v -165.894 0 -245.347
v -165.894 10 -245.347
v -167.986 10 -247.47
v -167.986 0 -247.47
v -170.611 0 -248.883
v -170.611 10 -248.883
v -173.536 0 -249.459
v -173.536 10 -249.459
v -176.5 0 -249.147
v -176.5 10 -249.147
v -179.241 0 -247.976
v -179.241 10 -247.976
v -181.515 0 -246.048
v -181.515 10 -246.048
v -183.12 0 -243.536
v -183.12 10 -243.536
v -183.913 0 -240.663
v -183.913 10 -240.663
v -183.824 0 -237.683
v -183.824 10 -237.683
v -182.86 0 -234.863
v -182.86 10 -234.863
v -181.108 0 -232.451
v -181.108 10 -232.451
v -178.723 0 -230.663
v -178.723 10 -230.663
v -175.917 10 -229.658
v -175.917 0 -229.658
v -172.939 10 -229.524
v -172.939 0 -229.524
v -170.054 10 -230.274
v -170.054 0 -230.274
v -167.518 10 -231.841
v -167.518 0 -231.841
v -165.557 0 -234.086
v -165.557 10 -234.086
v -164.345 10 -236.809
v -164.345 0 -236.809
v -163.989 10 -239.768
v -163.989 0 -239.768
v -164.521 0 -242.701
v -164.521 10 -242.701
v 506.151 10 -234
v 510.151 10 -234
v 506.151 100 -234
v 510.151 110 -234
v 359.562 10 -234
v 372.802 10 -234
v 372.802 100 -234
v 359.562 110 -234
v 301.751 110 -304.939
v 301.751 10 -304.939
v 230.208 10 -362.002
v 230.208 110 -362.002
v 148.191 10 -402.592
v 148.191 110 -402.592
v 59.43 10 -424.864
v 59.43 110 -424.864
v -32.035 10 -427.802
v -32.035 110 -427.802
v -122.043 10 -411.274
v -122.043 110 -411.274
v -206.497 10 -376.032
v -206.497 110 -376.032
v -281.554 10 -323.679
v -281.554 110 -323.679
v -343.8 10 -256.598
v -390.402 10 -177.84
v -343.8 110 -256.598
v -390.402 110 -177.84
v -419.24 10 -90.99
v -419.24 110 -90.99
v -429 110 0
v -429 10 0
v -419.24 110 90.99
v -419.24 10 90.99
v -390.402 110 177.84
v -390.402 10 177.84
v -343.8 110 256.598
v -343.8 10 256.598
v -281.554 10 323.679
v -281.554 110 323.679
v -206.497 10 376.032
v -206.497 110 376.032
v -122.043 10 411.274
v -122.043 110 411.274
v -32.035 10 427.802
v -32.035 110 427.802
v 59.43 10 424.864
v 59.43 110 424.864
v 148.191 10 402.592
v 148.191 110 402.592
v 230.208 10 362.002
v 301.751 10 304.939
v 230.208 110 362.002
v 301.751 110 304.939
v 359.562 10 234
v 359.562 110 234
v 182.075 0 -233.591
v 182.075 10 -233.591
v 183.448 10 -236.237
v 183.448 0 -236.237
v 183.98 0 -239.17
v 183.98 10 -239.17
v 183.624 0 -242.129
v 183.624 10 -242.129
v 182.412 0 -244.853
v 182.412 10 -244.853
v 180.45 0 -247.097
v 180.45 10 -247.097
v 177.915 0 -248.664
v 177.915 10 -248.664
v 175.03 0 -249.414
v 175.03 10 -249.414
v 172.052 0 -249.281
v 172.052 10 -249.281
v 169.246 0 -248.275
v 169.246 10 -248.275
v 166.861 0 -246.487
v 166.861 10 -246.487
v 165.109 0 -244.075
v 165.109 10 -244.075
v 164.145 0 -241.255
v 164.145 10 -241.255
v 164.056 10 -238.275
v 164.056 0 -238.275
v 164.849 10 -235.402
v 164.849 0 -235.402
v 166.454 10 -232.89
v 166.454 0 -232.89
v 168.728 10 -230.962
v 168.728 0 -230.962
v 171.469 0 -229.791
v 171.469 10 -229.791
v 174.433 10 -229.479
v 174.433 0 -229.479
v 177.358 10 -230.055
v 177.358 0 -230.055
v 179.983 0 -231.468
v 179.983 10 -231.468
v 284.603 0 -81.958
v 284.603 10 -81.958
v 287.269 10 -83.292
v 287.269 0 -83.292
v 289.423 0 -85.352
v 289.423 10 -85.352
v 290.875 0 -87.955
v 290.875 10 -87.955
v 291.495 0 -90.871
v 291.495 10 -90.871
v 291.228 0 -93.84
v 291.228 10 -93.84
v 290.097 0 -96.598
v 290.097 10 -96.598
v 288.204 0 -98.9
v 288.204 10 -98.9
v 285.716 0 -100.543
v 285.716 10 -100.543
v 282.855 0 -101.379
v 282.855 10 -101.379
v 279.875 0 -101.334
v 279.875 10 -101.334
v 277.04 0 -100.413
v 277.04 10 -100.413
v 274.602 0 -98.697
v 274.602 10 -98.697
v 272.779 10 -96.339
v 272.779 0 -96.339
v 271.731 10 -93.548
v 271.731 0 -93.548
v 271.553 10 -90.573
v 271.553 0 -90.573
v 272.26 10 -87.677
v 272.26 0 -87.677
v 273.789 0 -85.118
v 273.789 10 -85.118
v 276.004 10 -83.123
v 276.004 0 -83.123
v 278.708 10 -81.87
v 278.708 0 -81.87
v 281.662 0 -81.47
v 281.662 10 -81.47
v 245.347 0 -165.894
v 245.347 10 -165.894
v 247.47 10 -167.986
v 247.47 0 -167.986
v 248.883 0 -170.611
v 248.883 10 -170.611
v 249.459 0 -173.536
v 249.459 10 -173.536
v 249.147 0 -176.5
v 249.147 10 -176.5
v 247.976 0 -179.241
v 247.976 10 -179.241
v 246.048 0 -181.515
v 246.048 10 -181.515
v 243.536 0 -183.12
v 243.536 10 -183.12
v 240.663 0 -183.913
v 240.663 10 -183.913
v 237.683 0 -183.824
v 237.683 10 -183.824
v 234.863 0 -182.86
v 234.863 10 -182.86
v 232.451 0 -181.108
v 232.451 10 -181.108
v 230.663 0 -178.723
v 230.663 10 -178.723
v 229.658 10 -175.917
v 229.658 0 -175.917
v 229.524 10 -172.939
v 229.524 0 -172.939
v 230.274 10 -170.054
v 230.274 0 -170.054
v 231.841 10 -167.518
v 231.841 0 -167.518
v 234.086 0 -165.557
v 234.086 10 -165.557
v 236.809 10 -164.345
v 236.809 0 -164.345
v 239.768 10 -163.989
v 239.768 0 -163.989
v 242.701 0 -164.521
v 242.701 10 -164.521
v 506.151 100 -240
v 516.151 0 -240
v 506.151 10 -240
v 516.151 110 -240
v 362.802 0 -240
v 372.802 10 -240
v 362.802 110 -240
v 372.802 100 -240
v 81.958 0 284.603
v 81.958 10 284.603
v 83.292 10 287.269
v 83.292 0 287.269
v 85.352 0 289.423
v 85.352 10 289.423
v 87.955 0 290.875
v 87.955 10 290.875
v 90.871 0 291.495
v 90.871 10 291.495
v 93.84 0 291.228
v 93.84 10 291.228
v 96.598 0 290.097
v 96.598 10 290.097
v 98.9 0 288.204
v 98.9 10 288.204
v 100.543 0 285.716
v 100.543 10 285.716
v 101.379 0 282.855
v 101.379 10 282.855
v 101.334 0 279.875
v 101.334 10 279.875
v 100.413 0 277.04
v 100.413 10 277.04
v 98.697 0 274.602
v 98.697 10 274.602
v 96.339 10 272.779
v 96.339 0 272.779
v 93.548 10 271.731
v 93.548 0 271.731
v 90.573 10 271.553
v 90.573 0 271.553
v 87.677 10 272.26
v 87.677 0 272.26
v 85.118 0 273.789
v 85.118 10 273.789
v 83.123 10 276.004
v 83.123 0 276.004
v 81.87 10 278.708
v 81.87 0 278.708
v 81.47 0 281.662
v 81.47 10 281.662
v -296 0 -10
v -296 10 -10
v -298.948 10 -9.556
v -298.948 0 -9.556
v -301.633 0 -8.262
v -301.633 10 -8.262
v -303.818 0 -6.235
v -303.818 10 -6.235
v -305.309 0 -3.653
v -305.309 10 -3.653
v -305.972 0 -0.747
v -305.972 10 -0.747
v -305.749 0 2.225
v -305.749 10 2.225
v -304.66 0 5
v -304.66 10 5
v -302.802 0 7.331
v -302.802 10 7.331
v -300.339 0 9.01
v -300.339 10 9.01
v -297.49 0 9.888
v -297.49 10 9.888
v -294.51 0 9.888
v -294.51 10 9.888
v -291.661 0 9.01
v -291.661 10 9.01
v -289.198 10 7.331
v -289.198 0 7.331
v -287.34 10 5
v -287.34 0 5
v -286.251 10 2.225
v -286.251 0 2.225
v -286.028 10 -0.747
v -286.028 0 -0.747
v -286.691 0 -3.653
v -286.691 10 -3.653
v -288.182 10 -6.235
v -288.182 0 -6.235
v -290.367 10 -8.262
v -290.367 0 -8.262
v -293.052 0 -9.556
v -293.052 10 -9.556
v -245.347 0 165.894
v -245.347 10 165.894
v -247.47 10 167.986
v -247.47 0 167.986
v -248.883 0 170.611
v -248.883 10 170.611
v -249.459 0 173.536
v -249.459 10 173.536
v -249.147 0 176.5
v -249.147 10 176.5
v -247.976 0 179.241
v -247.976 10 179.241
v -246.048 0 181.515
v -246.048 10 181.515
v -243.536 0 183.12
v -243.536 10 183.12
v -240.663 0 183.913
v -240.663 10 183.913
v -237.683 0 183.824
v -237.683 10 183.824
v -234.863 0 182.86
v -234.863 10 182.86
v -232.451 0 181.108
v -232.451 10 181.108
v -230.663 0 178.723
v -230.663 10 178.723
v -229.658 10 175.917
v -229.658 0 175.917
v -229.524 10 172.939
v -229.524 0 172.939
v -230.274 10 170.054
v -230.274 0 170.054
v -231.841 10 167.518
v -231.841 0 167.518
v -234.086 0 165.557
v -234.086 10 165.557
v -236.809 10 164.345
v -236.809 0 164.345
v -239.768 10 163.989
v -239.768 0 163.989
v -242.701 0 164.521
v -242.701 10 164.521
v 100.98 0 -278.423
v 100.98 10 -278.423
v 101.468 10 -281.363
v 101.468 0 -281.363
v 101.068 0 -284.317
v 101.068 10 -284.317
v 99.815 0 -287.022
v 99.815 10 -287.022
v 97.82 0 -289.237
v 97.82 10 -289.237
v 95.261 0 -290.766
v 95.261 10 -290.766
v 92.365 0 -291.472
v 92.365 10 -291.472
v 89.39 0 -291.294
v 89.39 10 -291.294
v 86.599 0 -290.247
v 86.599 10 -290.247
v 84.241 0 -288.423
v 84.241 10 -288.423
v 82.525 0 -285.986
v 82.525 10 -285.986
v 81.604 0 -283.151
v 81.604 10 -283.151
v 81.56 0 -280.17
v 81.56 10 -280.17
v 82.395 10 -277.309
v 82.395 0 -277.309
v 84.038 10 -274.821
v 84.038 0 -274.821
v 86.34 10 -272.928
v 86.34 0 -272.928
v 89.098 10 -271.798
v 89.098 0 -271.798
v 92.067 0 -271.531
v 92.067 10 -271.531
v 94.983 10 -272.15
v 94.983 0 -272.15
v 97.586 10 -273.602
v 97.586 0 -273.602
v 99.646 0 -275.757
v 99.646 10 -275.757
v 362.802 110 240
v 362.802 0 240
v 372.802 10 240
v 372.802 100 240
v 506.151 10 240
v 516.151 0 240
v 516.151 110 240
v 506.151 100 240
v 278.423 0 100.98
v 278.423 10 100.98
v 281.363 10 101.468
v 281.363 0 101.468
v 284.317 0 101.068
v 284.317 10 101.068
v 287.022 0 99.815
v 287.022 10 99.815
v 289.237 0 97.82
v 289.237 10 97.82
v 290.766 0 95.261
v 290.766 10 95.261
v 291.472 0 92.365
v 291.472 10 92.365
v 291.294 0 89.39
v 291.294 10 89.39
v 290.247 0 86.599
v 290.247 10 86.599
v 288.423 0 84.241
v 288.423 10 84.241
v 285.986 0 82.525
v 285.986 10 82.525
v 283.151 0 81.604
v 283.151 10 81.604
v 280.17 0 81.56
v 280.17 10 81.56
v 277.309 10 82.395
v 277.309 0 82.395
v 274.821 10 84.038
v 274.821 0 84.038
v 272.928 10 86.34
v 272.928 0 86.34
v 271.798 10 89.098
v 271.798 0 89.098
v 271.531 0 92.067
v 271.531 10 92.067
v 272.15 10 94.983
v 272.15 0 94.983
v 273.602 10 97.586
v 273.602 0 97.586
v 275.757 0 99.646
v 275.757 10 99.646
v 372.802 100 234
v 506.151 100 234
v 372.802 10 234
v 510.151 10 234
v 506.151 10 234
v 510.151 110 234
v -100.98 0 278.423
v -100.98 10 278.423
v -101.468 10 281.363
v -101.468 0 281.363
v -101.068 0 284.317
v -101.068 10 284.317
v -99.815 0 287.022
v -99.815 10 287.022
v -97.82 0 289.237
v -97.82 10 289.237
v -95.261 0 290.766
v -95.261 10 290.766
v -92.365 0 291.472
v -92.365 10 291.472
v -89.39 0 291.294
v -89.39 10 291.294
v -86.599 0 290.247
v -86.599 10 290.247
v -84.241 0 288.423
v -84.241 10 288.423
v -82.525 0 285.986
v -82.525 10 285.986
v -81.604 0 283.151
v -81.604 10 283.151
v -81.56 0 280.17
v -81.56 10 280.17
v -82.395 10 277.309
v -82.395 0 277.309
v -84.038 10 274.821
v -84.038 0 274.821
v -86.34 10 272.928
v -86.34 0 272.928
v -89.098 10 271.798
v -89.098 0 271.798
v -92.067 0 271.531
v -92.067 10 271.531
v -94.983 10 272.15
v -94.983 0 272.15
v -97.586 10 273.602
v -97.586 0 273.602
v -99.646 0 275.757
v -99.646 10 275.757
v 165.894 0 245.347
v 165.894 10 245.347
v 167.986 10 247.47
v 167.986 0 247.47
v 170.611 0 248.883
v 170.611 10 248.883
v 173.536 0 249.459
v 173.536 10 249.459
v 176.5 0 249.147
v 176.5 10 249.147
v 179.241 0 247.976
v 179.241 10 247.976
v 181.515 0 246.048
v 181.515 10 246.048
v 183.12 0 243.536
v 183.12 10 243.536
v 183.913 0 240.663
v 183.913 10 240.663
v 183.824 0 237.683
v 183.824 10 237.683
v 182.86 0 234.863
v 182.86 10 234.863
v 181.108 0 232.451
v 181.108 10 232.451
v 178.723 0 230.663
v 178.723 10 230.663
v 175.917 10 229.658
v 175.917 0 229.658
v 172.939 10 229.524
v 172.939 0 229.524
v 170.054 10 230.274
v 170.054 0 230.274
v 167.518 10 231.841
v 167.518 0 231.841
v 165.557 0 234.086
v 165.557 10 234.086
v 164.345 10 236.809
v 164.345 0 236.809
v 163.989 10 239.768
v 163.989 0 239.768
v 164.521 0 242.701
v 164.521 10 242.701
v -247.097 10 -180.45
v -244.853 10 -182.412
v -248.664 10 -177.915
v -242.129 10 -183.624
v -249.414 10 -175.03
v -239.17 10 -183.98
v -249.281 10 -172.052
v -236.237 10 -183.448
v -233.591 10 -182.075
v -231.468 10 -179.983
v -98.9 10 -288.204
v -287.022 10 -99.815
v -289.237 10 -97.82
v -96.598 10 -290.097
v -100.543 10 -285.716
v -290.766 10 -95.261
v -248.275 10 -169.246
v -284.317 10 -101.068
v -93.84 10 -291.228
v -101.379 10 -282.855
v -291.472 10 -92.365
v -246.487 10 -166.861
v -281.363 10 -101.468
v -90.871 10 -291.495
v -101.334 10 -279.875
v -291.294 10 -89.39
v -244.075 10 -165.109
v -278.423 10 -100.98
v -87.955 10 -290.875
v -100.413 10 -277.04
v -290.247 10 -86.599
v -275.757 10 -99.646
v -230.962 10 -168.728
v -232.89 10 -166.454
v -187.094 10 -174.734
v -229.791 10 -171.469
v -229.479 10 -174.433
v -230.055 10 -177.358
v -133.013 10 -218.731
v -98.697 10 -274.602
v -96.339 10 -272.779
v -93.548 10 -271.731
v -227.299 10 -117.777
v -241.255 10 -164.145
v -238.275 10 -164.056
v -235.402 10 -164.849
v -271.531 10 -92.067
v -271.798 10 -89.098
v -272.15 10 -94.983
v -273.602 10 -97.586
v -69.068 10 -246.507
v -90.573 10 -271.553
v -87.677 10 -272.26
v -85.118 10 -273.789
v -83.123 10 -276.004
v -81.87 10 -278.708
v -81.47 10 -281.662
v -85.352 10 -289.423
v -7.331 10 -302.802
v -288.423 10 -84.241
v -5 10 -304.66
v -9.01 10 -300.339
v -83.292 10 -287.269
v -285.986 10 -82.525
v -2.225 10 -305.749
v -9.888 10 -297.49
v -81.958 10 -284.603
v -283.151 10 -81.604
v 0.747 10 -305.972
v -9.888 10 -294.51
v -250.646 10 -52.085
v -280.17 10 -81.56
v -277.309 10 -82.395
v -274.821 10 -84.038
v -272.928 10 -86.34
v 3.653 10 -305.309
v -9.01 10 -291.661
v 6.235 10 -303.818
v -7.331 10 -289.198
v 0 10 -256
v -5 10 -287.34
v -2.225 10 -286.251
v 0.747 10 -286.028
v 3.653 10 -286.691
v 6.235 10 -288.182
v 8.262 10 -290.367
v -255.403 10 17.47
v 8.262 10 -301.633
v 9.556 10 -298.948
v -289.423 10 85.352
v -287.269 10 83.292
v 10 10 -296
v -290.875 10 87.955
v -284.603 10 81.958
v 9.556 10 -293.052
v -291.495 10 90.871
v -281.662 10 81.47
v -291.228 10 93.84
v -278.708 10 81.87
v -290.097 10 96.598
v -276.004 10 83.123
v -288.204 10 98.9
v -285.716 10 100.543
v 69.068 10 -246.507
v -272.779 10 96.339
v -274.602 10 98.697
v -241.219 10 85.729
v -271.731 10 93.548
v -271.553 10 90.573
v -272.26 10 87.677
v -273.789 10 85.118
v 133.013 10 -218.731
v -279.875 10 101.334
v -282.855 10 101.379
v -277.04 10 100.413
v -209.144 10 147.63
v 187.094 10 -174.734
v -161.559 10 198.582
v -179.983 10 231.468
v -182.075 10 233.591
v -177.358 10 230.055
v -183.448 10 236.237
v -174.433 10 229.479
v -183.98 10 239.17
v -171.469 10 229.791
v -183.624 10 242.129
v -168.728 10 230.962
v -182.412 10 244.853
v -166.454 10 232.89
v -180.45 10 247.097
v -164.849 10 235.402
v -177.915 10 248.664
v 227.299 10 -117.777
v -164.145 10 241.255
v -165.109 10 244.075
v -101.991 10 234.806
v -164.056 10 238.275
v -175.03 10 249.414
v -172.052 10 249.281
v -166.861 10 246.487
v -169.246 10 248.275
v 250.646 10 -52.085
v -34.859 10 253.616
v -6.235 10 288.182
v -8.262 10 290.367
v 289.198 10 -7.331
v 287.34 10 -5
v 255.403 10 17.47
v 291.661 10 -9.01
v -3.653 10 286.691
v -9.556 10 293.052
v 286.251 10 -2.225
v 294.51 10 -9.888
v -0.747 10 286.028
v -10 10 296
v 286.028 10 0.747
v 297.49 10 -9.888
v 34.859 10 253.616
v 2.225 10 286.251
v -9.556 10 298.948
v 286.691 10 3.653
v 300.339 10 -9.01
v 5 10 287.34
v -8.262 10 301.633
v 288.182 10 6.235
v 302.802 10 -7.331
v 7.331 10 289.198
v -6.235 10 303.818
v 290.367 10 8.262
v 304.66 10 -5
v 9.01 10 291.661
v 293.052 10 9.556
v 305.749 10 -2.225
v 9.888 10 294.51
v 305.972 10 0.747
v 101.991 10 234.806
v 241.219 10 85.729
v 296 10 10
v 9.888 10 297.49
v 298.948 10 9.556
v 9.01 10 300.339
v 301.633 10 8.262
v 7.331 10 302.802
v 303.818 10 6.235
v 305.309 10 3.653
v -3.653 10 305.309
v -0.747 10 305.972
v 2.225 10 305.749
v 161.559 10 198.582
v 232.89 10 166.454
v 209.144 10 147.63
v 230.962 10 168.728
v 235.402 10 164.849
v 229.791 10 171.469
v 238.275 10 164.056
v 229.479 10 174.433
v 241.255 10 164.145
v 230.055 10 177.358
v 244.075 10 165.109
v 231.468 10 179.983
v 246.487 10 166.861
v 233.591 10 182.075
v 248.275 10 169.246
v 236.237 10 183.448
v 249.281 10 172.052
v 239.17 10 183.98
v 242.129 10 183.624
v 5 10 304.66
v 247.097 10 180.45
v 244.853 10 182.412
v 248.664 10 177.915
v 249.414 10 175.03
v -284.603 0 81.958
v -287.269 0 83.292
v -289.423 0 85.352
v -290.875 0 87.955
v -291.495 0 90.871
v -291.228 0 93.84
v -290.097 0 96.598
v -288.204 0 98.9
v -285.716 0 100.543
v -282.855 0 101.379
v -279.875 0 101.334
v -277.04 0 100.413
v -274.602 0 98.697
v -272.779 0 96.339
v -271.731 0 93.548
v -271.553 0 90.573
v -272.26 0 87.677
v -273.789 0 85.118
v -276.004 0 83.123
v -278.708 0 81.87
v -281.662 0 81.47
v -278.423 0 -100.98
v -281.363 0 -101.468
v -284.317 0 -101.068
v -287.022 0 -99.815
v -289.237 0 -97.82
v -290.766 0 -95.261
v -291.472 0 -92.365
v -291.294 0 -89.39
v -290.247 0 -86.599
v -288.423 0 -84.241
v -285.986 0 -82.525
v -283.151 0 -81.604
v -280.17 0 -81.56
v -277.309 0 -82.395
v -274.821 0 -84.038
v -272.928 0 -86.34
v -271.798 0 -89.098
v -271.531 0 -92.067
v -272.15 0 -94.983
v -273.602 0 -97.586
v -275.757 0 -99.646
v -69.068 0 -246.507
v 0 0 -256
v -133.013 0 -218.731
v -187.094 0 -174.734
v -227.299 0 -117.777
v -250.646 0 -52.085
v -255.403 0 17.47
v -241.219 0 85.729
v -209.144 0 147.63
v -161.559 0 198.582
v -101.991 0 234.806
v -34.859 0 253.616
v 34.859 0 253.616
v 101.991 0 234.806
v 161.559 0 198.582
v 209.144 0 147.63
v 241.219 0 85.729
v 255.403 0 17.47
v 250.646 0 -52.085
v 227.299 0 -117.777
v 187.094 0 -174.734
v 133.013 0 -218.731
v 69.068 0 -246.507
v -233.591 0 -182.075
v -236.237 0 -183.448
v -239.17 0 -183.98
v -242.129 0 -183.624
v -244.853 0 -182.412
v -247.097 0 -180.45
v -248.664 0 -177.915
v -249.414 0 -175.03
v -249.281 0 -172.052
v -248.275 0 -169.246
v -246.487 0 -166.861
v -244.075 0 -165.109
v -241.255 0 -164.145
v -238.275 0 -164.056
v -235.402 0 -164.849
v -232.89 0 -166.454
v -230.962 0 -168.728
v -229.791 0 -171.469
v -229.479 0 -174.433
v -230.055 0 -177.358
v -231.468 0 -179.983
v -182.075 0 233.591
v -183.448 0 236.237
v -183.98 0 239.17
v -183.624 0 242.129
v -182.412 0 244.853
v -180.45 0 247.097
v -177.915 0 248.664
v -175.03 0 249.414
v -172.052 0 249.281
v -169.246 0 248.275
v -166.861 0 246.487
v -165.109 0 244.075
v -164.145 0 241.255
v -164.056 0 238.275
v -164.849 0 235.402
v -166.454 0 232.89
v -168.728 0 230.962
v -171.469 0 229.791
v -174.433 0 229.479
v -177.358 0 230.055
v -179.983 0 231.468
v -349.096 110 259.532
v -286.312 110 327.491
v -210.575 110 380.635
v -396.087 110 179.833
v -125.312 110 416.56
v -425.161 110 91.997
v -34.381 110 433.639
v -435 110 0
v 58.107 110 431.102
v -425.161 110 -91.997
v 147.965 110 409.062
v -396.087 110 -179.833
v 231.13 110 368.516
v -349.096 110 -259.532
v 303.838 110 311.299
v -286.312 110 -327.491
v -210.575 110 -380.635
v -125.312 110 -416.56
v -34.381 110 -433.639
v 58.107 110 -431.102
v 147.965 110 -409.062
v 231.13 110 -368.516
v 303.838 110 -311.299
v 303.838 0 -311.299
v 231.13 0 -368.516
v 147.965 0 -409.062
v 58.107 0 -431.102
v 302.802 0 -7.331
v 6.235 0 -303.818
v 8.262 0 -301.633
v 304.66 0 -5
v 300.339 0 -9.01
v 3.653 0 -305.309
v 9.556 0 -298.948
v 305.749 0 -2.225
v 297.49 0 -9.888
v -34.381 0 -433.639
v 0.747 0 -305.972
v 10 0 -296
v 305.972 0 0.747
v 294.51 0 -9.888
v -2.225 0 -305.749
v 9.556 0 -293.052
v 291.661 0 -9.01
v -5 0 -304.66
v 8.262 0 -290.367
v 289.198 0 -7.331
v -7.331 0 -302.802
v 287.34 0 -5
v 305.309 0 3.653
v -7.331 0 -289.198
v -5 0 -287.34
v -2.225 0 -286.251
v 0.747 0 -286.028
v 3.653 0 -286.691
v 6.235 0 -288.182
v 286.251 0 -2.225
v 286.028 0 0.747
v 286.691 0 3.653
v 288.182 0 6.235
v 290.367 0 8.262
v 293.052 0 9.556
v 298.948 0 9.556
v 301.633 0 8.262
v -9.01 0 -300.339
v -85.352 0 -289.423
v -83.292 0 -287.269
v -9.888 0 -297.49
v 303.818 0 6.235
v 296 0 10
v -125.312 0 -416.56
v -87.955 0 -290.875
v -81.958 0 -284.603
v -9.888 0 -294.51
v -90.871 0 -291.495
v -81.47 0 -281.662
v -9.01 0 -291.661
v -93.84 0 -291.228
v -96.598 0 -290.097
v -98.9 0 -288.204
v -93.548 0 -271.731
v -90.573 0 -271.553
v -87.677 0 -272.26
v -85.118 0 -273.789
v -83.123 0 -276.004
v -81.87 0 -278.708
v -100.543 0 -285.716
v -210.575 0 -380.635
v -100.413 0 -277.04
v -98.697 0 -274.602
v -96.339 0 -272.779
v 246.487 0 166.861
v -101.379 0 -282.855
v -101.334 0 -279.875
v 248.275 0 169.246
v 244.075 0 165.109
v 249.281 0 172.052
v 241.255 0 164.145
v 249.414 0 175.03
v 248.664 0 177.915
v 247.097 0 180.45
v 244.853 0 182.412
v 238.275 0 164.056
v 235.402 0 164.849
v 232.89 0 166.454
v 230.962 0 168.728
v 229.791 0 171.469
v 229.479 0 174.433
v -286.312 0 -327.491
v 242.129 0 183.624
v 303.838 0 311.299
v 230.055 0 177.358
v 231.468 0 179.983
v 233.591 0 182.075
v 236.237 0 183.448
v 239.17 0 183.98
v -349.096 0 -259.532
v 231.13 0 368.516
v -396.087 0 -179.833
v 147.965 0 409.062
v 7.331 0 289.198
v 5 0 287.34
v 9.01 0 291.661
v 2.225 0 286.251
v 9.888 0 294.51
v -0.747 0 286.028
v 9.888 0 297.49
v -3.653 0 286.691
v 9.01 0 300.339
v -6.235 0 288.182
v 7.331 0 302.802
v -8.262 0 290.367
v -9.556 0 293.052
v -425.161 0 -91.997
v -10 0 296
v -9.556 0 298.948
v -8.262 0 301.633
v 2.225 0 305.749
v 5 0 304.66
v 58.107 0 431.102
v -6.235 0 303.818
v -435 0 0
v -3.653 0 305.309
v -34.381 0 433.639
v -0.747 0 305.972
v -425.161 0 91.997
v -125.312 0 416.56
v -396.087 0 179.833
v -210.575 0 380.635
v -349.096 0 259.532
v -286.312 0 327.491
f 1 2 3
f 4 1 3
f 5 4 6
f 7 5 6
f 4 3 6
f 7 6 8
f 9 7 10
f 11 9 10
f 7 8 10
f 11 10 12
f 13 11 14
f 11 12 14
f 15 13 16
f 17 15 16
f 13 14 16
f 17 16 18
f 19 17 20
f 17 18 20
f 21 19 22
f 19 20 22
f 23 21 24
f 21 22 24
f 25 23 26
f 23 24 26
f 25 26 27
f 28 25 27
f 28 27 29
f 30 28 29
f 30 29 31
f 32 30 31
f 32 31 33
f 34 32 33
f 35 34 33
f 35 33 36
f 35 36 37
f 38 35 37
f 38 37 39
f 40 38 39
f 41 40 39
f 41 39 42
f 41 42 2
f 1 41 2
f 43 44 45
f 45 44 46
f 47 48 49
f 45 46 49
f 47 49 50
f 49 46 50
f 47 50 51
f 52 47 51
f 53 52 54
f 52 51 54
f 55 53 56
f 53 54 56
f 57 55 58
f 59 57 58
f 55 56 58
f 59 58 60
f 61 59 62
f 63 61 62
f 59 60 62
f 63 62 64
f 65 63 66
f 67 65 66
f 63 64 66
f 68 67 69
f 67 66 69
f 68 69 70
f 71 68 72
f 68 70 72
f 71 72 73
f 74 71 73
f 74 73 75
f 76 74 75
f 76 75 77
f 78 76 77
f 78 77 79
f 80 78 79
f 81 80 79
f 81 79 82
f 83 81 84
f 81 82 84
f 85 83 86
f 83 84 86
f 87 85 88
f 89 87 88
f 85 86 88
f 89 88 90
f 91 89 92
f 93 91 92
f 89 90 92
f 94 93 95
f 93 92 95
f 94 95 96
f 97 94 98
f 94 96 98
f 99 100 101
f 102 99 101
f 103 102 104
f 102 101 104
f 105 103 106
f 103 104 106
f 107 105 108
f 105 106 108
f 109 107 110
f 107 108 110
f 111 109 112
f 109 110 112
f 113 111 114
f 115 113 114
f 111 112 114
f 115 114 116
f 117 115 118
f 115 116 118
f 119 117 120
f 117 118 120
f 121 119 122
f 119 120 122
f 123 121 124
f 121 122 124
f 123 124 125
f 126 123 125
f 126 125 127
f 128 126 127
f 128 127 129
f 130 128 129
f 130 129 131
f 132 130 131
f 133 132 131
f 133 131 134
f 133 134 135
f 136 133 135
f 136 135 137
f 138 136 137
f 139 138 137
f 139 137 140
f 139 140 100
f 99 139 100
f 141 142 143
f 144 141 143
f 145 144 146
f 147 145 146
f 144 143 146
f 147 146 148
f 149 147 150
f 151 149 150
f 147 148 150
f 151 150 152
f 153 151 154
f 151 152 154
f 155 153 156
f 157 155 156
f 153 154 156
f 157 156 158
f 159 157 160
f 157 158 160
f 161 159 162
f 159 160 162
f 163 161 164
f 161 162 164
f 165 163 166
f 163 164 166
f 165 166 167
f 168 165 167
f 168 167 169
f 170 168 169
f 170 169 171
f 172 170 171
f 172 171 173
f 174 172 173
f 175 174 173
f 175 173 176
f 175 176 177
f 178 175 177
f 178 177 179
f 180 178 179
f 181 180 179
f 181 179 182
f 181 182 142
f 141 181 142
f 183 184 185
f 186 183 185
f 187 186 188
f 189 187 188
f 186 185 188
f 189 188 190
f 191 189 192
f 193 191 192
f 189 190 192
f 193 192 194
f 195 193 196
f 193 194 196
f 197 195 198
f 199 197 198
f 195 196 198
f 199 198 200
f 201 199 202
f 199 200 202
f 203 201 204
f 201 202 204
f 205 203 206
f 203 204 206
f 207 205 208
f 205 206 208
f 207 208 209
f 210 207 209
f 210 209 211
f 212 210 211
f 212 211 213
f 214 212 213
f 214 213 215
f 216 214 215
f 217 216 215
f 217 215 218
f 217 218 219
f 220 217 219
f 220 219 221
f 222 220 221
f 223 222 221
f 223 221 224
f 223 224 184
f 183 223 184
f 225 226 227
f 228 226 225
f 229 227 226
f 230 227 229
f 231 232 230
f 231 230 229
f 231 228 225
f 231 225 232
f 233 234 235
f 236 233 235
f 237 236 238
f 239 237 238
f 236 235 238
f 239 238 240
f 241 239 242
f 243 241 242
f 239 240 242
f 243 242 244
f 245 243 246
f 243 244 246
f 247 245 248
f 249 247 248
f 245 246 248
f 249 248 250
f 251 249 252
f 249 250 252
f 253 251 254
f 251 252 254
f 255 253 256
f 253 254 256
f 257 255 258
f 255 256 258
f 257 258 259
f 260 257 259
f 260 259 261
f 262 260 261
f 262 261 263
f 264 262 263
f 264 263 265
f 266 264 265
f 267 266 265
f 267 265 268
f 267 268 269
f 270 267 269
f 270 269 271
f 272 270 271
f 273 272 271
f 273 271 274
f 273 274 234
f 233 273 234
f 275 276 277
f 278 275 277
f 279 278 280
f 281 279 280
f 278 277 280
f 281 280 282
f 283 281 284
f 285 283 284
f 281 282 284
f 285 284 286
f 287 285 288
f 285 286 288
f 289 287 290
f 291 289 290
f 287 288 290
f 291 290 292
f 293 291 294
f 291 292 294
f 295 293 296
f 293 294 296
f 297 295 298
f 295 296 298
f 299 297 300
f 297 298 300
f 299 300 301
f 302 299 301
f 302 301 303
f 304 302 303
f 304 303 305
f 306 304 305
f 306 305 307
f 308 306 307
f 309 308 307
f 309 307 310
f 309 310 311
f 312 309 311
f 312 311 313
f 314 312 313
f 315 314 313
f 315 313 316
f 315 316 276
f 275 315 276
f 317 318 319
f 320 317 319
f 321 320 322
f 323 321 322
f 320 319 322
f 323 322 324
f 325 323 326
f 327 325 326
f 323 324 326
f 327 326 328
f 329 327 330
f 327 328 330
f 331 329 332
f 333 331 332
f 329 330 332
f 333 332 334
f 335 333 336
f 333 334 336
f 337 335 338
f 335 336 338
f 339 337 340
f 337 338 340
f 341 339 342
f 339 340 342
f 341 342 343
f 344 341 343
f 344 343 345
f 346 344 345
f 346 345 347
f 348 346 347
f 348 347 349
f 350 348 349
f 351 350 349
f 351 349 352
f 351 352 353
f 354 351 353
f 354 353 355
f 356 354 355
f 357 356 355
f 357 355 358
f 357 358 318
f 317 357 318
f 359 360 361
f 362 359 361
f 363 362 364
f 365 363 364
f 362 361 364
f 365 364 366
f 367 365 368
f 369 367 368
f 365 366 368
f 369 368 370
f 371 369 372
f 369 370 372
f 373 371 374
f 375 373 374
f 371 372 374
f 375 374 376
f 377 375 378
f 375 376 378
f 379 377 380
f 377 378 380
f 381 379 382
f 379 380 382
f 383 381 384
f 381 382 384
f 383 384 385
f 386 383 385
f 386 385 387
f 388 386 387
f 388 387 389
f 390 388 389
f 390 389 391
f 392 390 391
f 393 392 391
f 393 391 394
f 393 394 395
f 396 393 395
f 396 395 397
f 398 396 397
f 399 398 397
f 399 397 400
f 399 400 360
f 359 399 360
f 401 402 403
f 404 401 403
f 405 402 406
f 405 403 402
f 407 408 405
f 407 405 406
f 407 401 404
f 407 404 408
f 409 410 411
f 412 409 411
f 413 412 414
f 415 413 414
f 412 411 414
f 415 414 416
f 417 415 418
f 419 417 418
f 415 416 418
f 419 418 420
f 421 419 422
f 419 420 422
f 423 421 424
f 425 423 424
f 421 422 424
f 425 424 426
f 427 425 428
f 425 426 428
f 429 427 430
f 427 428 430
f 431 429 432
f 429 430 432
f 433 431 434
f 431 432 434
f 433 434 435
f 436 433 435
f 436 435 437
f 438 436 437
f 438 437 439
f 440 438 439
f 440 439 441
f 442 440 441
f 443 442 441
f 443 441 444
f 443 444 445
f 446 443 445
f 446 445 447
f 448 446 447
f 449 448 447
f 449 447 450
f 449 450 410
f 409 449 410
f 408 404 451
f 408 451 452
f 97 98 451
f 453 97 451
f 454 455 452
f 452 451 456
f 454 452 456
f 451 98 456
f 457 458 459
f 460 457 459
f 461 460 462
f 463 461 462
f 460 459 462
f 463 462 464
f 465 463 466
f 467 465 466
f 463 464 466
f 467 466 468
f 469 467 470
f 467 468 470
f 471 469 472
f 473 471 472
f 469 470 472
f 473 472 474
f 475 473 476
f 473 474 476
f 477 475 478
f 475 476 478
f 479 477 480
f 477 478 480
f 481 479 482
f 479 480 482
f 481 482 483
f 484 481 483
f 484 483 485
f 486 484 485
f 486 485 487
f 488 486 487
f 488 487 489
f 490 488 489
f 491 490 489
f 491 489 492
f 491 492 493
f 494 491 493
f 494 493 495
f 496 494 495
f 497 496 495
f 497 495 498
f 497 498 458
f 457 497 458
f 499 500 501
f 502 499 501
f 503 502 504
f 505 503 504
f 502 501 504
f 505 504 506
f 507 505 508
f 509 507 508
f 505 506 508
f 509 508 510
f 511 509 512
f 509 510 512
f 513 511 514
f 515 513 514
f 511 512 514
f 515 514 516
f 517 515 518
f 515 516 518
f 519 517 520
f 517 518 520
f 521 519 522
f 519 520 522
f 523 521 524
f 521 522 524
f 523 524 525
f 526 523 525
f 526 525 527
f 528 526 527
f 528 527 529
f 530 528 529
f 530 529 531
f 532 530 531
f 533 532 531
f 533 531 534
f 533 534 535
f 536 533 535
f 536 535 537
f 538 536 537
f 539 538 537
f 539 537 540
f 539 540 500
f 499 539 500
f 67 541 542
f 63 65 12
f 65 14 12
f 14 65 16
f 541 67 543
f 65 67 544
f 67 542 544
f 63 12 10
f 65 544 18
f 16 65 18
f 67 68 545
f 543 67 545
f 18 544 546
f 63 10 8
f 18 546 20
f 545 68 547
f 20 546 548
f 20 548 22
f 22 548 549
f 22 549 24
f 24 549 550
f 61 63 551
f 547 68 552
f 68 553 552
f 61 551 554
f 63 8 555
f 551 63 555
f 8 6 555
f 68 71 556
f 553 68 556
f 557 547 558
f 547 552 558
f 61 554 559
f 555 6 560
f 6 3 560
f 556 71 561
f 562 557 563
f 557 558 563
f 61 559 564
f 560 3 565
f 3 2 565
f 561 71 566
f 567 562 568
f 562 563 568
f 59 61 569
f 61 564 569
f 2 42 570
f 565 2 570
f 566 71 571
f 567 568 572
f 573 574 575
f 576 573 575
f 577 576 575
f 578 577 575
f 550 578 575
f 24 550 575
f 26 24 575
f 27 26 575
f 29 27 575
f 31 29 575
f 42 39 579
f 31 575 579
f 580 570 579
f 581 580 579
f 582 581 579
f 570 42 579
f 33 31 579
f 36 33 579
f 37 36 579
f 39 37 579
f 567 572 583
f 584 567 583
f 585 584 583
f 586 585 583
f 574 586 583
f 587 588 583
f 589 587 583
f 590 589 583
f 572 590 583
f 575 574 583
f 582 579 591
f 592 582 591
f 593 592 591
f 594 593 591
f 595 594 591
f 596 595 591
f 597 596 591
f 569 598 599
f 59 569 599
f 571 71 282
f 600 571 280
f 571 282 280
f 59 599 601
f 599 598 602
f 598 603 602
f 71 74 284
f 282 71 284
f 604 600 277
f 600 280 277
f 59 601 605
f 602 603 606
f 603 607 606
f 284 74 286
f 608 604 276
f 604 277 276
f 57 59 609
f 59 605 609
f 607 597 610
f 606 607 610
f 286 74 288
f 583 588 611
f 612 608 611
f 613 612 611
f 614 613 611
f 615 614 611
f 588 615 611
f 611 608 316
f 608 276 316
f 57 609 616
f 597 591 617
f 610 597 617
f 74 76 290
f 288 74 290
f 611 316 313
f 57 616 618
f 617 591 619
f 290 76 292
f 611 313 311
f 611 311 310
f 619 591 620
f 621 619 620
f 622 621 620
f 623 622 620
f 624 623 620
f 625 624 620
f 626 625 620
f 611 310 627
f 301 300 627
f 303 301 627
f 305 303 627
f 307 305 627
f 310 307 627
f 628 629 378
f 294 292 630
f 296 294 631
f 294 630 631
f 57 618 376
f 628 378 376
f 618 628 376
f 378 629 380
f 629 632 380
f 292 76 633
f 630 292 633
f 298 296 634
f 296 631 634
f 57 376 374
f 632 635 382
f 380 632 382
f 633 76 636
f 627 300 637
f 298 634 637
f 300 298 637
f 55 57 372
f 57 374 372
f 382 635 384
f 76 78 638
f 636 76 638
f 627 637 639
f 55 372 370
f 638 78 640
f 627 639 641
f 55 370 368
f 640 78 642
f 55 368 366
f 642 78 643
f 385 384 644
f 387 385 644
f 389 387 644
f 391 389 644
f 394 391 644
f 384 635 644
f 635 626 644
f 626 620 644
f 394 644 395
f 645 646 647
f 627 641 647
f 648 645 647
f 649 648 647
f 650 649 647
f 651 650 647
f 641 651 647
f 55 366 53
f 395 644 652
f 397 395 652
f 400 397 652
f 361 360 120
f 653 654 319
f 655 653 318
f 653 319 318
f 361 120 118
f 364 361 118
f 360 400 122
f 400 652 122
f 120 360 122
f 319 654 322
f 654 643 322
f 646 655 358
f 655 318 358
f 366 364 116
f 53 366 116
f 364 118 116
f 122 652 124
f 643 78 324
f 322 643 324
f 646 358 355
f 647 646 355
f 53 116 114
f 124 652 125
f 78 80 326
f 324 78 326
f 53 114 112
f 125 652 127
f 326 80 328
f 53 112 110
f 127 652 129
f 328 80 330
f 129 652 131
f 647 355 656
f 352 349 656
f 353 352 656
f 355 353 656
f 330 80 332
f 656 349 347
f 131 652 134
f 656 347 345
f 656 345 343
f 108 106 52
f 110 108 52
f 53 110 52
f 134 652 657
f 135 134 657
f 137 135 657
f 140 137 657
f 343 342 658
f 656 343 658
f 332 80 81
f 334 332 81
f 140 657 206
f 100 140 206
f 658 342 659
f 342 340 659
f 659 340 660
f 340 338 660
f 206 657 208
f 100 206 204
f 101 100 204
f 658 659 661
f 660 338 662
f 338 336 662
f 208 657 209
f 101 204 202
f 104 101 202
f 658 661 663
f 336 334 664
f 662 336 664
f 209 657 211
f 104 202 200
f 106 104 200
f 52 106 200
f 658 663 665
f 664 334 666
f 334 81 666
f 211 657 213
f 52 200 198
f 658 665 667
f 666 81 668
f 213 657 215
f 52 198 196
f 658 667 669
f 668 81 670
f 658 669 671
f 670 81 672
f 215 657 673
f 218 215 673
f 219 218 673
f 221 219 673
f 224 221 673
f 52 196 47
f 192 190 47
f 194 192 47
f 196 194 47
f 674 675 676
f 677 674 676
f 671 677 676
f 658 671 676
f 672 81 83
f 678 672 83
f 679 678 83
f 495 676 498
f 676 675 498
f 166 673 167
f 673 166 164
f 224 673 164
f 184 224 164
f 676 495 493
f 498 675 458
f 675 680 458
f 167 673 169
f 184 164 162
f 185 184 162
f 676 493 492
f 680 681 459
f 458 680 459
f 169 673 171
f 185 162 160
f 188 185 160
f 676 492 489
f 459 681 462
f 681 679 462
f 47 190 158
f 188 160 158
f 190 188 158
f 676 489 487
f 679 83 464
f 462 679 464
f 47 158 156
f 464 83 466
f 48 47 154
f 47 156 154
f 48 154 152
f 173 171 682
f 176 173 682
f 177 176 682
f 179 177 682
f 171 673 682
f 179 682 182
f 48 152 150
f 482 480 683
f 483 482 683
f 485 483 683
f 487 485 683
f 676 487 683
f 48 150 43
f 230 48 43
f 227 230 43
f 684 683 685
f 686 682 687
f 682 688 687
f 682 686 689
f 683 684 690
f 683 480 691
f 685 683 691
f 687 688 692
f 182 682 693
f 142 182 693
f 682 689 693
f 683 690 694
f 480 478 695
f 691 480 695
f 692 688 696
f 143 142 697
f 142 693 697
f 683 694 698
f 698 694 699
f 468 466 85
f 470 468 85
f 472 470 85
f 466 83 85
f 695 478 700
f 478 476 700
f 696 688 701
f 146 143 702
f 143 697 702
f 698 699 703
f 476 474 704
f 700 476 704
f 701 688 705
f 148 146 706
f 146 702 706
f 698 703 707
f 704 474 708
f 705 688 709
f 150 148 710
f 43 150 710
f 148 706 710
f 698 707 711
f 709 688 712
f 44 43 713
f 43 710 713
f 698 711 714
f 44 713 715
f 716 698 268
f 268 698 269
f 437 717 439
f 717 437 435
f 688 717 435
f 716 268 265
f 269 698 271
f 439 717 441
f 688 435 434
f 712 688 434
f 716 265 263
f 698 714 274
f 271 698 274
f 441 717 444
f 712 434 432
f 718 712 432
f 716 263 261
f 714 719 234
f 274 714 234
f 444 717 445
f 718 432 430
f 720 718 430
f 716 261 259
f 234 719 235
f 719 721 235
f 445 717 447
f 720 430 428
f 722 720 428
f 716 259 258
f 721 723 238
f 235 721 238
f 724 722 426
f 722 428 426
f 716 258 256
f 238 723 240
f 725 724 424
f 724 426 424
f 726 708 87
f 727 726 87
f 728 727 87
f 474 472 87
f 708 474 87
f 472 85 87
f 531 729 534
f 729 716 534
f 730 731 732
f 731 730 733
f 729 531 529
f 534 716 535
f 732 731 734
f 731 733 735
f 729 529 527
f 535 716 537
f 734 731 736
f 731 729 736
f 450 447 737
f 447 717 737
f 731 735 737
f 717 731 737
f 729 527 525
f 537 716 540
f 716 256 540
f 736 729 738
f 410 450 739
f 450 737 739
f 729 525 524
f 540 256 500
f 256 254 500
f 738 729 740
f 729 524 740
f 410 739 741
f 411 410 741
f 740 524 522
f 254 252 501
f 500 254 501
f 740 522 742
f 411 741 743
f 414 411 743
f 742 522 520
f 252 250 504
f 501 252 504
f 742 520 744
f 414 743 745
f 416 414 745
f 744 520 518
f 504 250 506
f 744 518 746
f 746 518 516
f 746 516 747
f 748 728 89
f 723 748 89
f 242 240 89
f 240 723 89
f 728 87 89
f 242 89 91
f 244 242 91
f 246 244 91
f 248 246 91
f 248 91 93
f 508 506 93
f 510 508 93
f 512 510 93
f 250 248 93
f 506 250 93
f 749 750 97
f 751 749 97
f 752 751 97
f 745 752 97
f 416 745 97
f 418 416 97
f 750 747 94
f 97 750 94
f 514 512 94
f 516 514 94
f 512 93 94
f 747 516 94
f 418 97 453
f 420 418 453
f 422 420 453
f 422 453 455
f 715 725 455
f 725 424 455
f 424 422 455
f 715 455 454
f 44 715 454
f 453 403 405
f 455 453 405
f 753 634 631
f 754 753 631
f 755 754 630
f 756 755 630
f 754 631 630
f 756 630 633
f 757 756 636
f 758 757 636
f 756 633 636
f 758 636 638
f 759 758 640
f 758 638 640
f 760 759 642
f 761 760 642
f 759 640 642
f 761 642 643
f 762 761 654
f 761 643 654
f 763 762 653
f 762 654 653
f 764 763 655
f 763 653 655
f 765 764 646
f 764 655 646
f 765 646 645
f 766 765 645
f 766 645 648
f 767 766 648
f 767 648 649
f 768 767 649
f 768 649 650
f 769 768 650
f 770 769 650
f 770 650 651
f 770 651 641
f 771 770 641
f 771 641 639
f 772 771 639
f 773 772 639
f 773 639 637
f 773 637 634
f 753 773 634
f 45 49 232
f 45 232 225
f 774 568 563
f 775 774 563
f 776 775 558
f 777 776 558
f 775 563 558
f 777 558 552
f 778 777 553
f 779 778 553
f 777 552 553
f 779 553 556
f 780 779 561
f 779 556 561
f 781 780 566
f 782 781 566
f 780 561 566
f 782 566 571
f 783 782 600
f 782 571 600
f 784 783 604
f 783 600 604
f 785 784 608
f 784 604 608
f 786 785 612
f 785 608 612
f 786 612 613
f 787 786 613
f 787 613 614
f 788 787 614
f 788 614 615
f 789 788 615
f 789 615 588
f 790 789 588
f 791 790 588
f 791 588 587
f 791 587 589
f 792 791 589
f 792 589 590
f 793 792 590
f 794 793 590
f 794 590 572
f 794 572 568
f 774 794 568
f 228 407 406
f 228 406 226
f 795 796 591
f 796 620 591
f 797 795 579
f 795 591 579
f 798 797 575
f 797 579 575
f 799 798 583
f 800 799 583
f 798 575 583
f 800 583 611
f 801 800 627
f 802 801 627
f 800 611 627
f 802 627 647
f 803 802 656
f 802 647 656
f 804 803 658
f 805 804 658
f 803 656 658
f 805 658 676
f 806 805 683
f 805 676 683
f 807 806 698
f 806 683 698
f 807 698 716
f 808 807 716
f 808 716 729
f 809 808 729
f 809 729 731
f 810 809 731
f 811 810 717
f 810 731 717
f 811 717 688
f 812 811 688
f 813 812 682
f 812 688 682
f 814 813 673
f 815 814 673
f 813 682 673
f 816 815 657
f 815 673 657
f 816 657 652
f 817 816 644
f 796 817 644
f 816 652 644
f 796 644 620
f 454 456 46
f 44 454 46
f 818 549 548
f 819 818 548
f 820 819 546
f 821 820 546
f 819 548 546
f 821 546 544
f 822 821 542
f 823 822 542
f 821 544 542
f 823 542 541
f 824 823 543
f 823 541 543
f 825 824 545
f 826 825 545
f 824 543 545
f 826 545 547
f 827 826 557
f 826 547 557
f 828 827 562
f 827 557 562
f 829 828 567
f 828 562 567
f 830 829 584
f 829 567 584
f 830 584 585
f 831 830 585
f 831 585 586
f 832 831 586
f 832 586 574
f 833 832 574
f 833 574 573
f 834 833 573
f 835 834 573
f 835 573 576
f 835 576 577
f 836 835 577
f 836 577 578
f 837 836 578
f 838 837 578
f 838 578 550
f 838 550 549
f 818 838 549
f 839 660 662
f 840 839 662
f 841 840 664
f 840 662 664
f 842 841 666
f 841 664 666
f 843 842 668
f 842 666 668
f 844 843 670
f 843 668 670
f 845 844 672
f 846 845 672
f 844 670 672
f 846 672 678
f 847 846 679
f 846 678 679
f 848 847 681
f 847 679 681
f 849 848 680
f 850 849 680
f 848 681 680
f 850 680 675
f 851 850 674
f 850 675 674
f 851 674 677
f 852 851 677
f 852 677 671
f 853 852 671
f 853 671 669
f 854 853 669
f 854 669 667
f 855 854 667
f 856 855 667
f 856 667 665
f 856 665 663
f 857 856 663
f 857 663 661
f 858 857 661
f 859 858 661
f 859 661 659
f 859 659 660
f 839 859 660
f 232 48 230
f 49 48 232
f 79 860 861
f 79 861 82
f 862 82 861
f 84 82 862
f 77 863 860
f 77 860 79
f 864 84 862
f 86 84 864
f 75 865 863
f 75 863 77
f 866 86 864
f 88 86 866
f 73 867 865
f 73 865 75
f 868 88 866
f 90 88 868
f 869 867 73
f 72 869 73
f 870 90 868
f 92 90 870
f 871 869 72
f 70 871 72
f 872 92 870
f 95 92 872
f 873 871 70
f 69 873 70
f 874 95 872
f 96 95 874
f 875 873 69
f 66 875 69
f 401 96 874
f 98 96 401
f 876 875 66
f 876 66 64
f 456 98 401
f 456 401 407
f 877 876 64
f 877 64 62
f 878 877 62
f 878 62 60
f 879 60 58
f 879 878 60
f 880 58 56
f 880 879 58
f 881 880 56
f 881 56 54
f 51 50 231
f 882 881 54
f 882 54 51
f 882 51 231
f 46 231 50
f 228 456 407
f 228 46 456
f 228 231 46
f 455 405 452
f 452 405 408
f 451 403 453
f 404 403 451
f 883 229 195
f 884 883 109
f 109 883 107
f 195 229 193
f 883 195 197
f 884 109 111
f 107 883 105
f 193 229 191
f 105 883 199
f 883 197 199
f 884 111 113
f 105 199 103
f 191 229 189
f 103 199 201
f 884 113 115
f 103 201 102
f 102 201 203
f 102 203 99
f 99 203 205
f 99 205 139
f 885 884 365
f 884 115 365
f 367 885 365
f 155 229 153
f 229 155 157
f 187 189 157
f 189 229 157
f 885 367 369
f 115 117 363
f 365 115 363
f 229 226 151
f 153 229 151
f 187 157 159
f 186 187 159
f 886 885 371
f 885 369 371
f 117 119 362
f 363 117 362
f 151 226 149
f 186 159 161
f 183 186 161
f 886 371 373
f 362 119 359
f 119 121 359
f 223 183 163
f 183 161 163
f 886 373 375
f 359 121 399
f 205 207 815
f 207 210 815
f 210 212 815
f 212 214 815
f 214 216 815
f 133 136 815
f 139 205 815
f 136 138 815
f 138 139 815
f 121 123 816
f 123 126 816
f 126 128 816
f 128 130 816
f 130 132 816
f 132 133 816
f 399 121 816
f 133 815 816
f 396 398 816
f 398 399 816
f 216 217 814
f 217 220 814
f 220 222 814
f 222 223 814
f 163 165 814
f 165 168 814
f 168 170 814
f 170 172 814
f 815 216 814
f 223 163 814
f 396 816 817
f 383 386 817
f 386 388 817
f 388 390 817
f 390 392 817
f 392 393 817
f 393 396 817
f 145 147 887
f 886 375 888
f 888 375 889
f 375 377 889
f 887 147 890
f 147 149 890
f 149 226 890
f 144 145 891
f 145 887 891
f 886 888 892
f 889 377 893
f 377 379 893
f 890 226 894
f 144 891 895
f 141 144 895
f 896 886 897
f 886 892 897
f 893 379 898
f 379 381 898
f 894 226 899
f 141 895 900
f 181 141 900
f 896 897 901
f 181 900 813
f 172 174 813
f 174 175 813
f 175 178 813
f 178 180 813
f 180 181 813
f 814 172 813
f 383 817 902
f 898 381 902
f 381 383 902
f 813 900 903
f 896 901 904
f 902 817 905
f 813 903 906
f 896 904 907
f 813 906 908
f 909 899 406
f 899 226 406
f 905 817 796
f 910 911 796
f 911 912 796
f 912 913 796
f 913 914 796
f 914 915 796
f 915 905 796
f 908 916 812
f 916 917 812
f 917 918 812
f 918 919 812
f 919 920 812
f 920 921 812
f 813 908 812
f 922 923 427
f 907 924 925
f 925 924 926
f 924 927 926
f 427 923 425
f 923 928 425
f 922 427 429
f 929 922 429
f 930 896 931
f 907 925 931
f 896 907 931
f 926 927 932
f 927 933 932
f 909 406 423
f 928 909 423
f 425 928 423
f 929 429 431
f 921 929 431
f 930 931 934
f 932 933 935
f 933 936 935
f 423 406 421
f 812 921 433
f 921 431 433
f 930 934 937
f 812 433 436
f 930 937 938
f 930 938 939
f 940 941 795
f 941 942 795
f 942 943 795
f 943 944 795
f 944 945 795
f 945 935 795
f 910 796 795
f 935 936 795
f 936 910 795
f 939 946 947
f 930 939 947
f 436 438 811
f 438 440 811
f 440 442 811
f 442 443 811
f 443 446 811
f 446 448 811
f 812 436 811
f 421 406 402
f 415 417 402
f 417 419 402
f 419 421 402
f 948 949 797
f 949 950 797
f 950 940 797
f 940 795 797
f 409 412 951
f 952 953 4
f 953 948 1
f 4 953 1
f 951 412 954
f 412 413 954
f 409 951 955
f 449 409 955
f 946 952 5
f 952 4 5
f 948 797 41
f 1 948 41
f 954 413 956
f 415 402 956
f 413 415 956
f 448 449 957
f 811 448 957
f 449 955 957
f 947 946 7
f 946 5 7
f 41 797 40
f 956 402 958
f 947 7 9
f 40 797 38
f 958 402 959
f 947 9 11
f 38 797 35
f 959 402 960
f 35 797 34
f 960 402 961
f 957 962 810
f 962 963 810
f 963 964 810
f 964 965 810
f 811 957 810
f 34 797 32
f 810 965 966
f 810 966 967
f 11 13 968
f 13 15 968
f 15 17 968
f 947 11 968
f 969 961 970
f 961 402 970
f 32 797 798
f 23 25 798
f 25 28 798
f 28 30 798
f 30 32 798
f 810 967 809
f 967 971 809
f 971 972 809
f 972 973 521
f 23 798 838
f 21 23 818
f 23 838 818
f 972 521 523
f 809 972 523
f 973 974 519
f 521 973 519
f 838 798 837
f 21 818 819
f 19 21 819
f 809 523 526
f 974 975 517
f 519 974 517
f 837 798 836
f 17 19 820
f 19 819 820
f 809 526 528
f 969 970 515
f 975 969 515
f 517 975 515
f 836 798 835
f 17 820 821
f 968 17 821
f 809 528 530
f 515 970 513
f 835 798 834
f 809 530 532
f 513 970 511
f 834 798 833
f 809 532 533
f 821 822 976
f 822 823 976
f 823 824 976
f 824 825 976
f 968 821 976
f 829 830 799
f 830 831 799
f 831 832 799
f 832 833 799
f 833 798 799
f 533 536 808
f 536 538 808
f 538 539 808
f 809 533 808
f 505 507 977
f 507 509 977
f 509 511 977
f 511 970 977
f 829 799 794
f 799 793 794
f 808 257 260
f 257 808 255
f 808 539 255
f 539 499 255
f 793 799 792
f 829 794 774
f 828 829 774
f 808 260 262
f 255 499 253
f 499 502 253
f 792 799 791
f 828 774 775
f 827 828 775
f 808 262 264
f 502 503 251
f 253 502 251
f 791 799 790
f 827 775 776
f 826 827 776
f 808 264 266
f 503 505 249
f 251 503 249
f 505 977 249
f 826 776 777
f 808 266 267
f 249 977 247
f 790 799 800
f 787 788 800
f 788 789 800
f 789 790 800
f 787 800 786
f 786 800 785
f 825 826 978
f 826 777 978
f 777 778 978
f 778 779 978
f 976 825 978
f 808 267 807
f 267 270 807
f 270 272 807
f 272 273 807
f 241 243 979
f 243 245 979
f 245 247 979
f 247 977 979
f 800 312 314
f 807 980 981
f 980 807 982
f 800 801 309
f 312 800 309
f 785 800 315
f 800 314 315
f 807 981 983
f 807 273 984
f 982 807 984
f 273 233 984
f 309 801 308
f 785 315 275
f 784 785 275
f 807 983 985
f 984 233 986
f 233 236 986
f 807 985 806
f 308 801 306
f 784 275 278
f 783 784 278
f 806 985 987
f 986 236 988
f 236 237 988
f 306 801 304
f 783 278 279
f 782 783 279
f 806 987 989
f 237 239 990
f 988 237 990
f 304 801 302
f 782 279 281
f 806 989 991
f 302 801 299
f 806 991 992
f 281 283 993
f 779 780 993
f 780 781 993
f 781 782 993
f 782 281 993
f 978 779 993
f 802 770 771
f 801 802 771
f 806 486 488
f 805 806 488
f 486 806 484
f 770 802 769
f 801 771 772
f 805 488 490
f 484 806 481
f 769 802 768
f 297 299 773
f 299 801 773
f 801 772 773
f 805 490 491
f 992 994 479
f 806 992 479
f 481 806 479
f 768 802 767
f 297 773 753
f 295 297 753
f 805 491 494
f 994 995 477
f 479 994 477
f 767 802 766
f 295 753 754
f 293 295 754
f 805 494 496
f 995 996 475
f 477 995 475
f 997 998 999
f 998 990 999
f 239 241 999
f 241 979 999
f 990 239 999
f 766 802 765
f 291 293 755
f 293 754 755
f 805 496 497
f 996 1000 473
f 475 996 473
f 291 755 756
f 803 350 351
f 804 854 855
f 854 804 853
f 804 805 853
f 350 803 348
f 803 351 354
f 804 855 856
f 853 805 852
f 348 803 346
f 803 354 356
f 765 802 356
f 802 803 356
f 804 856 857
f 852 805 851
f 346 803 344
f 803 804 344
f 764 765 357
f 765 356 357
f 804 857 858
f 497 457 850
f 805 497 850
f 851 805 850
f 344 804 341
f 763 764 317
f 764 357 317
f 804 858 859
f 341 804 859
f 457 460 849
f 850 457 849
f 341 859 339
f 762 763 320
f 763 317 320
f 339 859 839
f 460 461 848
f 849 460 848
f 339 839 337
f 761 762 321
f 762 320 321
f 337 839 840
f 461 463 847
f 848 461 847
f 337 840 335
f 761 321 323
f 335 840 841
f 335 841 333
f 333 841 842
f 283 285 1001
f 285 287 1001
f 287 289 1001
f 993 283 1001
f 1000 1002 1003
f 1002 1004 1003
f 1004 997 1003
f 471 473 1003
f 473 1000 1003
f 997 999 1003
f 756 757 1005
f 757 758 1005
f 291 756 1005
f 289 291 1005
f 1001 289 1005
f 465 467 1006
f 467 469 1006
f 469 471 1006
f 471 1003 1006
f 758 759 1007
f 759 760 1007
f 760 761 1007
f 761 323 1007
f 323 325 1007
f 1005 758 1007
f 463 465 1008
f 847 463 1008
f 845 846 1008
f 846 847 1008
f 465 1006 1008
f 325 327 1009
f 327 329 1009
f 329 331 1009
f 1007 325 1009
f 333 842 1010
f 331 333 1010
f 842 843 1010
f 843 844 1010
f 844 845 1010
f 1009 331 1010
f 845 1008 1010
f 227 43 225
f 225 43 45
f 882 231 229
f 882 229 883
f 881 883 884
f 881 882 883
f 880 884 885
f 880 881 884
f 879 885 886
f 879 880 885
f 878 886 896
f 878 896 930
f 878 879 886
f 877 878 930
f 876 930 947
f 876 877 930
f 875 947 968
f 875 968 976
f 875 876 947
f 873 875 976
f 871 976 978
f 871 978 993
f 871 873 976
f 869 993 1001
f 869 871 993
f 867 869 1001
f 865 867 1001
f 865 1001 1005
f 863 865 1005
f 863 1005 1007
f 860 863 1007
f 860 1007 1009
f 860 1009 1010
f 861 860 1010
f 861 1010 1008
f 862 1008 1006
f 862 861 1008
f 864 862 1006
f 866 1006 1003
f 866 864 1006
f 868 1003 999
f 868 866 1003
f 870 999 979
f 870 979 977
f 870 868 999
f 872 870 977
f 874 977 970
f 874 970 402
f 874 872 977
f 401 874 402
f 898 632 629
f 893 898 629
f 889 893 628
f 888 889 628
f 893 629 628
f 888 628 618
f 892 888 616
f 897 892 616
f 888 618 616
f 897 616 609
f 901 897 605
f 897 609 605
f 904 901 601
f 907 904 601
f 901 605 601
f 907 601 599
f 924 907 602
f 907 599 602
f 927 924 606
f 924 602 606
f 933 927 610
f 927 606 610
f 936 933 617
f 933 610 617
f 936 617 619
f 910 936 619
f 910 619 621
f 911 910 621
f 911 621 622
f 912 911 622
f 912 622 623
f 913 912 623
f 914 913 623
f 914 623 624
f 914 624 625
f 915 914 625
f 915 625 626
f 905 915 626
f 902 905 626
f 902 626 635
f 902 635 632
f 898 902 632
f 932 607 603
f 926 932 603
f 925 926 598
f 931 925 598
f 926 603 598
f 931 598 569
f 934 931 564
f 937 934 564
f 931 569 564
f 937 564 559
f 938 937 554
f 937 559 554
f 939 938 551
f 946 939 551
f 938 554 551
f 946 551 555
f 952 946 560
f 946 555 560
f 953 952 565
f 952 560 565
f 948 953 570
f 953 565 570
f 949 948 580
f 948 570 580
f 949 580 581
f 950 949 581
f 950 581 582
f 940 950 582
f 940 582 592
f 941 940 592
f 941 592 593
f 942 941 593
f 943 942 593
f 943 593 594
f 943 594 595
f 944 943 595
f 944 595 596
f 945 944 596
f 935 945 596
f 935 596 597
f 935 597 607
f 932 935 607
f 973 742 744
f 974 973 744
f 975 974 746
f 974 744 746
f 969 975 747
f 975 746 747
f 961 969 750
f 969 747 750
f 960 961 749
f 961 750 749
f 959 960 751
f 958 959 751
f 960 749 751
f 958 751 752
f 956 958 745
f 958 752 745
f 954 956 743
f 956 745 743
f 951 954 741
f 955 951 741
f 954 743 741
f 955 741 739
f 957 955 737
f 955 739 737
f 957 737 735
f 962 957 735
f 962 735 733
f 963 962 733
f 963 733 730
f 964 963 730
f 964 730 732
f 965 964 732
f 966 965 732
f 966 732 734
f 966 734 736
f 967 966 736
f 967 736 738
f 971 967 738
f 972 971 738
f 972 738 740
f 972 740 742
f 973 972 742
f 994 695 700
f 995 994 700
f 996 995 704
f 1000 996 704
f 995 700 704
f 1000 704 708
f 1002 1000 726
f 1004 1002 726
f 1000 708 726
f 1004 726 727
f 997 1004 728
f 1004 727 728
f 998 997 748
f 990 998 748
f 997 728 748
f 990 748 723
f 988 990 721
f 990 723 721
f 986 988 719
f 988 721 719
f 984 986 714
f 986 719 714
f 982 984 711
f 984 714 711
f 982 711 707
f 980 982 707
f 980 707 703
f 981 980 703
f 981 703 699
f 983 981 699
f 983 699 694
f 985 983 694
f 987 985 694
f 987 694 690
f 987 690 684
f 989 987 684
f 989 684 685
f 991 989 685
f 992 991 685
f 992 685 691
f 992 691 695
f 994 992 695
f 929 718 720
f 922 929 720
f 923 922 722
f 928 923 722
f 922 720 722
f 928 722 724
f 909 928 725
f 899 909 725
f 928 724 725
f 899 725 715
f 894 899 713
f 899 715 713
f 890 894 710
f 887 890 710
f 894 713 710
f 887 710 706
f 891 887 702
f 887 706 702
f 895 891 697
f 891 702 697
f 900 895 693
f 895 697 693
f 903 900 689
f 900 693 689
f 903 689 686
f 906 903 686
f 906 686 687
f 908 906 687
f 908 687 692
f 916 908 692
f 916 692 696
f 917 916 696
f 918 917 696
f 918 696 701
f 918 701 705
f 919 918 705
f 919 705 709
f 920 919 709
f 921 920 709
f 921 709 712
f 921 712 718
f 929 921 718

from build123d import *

# Parameters (mm, degrees)
ESQUISSE1_W                  = 80
ESQUISSE1_H                  = 10
ESQUISSE3_R                  = 10
ENL_V_MAT_EXTRU_1_DEPTH      = 476.280969533
R_P_TITION_CIRCULAIRE1_COUNT = 20
BOSS_EXTRU_1_START           = -10
BOSS_EXTRU_1_DEPTH           = 10
BOSS_EXTRU_2_START           = -10
BOSS_EXTRU_2_DEPTH           = 10
BOSS_EXTRU_3_START           = 100
BOSS_EXTRU_3_DEPTH           = 100
ESQUISSE8_W                  = 133.349416634
ESQUISSE8_H                  = 90
ENL_V_MAT_EXTRU_2_DEPTH      = 857.817874815


with BuildPart() as part:
    # Esquisse1 → Révolution1 (revolve)
    with BuildSketch(Plane.XY, mode=Mode.PRIVATE) as r_volution1_sk:
        with Locations((296, 5)):
            Rectangle(ESQUISSE1_W, ESQUISSE1_H)
    revolve(r_volution1_sk.sketch.rotate(Axis((0, 0, 0), (0, 1, 0)), 90), axis=Axis((0, 0, 0), (0, 1, 0)))

    # Esquisse3 → Enlèv. mat.-Extru.1 (cut, through all)
    with BuildSketch(Plane(origin=(0, 10, 0), x_dir=(1, 0, 0), z_dir=(0, 1, 0))):
        with Locations(Location((296, 0, 0), (0, 0, 270))):
            Circle(ESQUISSE3_R)
    enl_v_mat_extru_1 = extrude(amount=-ENL_V_MAT_EXTRU_1_DEPTH, mode=Mode.SUBTRACT)

    # Répétition circulaire1: Enlèv. mat.-Extru.1 ×20 about axis
    r_p_tition_circulaire1_axis = Axis((0, 0, 0), (0, 1, 0))
    for i in range(1, R_P_TITION_CIRCULAIRE1_COUNT):
        add(enl_v_mat_extru_1.rotate(r_p_tition_circulaire1_axis, i * 360 / R_P_TITION_CIRCULAIRE1_COUNT), mode=Mode.SUBTRACT)

    # Esquisse4 → Boss.-Extru.1 (add)
    with BuildSketch(Plane.XZ.offset(BOSS_EXTRU_1_START)):
        with BuildLine():
            Line((516.151015307, -240), (516.151015307, 240))
            Line((516.151015307, 240), (235.151015307, 240))
            ThreePointArc((235.151015307, 240), (336, 0), (235.151015307, -240))
            Line((235.151015307, -240), (516.151015307, -240))
        make_face()
    extrude(amount=BOSS_EXTRU_1_DEPTH)

    # Esquisse5 → Boss.-Extru.2 (add)
    with BuildSketch(Plane.XZ.offset(BOSS_EXTRU_2_START)):
        with BuildLine():
            Line((235.151015307, -240), (362.801598673, -240))
            ThreePointArc((362.801598673, -240), (-435, 0), (362.801598673, 240))
            Line((362.801598673, 240), (235.151015307, 240))
            ThreePointArc((235.151015307, 240), (-336, 0), (235.151015307, -240))
        make_face()
    extrude(amount=BOSS_EXTRU_2_DEPTH)

    # Esquisse6 → Boss.-Extru.3 (add)
    with BuildSketch(Plane(origin=(0, 10, 0), x_dir=(1, 0, 0), z_dir=(0, 1, 0)).offset(BOSS_EXTRU_3_START)):
        with BuildLine():
            Line((516.151015307, 240), (362.801598673, 240))
            ThreePointArc((362.801598673, 240), (-435, 0), (362.801598673, -240))
            Line((362.801598673, -240), (516.151015307, -240))
            Line((516.151015307, -240), (516.151015307, 240))
        make_face()
        with BuildLine():
            ThreePointArc((359.562233834, 234), (-429, 0), (359.562233834, -234))
            Line((359.562233834, -234), (510.151015307, -234))
            Line((510.151015307, -234), (510.151015307, 234))
            Line((510.151015307, 234), (359.562233834, 234))
        make_face(mode=Mode.SUBTRACT)
    extrude(amount=-BOSS_EXTRU_3_DEPTH)

    # Esquisse8 → Enlèv. mat.-Extru.2 (cut, through all)
    with BuildSketch(Plane.XY.offset(240)):
        with Locations((439.47630699, 55)):
            Rectangle(ESQUISSE8_W, ESQUISSE8_H)
    extrude(amount=-ENL_V_MAT_EXTRU_2_DEPTH, mode=Mode.SUBTRACT)


solid = part.part
